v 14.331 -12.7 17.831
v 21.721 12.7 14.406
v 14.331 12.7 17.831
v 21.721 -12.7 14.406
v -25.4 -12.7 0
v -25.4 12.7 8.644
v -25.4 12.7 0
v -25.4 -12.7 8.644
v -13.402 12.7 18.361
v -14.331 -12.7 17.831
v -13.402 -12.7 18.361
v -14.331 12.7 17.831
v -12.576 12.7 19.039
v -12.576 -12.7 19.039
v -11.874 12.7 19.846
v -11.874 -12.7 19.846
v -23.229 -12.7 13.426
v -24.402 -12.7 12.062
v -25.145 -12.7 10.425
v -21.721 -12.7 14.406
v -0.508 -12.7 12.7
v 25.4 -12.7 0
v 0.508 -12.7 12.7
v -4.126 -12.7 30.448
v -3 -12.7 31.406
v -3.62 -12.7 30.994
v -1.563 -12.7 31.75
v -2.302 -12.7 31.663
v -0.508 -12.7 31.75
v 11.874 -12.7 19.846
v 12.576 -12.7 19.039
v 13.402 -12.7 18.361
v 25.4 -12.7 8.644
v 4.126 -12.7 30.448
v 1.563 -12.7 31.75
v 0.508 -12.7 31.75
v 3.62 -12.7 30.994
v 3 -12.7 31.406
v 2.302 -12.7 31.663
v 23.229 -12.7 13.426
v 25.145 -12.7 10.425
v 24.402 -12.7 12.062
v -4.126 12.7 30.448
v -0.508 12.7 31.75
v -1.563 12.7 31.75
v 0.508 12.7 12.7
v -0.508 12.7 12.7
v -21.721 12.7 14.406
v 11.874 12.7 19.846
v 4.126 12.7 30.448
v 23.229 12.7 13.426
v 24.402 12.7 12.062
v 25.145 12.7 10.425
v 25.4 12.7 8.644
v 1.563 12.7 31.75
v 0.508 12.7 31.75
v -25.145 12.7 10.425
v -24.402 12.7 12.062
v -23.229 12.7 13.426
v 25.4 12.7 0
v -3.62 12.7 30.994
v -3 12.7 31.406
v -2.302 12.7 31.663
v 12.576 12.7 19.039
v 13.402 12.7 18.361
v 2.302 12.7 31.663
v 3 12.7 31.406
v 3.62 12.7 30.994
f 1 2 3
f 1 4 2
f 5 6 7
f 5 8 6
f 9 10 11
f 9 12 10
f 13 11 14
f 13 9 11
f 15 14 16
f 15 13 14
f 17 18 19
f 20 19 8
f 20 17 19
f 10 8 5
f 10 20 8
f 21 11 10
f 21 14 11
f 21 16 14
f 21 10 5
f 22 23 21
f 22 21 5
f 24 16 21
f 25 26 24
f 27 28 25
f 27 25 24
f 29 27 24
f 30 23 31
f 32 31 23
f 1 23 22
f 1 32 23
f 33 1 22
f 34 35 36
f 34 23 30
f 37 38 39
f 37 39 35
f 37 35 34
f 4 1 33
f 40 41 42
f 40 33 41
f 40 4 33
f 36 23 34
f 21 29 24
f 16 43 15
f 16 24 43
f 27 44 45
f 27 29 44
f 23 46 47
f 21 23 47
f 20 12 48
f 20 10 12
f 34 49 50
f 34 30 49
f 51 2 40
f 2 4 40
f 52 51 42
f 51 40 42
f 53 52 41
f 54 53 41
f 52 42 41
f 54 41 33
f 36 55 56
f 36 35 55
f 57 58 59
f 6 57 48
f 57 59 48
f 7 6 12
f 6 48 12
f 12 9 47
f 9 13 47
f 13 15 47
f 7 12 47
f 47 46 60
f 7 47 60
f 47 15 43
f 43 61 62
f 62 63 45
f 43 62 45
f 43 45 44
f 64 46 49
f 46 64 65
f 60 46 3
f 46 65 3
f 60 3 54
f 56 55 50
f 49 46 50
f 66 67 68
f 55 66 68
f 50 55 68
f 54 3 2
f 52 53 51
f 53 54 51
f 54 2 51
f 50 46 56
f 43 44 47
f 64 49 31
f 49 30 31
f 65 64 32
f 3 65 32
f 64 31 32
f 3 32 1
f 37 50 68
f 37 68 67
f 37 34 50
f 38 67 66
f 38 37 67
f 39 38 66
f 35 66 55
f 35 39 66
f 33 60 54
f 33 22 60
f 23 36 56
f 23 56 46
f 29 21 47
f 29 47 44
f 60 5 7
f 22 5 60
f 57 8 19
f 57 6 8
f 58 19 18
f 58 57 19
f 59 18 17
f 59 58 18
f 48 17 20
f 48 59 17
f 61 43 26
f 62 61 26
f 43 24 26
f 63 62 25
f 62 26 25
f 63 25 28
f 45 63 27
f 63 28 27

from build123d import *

# Parameters (mm, degrees)
F1_DEPTH = 12.7
F2_R     = 6.35
F3_R     = 3.175


with BuildPart() as f1:
    # F0 (on Front) → F1 (new body, symmetric)
    with BuildSketch(Plane.XZ):
        Polygon((-25.4, 0), (25.4, 0), (25.4, 12.7), (12.842343, 18.521002), (3.175, 31.75), (0.508, 31.75), (0.508, 12.7), (-0.508, 12.7), (-0.508, 31.75), (-3.175, 31.75), (-12.842343, 18.521002), (-25.4, 12.7), align=None)
    extrude(amount=F1_DEPTH, both=True)

    # F2
    f2_edges = [f1.edges().sort_by_distance(p)[0] for p in [
        (25.4, 0, 12.7),
        (12.842343, 0, 18.521002),
        (-12.842343, 0, 18.521002),
        (-25.4, 0, 12.7),
    ]]
    fillet(f2_edges, radius=F2_R)

    # F3
    f3_edges = [f1.edges().sort_by_distance(p)[0] for p in [
        (3.175, 0, 31.75),
        (-3.175, 0, 31.75),
    ]]
    fillet(f3_edges, radius=F3_R)


solid = f1.part
